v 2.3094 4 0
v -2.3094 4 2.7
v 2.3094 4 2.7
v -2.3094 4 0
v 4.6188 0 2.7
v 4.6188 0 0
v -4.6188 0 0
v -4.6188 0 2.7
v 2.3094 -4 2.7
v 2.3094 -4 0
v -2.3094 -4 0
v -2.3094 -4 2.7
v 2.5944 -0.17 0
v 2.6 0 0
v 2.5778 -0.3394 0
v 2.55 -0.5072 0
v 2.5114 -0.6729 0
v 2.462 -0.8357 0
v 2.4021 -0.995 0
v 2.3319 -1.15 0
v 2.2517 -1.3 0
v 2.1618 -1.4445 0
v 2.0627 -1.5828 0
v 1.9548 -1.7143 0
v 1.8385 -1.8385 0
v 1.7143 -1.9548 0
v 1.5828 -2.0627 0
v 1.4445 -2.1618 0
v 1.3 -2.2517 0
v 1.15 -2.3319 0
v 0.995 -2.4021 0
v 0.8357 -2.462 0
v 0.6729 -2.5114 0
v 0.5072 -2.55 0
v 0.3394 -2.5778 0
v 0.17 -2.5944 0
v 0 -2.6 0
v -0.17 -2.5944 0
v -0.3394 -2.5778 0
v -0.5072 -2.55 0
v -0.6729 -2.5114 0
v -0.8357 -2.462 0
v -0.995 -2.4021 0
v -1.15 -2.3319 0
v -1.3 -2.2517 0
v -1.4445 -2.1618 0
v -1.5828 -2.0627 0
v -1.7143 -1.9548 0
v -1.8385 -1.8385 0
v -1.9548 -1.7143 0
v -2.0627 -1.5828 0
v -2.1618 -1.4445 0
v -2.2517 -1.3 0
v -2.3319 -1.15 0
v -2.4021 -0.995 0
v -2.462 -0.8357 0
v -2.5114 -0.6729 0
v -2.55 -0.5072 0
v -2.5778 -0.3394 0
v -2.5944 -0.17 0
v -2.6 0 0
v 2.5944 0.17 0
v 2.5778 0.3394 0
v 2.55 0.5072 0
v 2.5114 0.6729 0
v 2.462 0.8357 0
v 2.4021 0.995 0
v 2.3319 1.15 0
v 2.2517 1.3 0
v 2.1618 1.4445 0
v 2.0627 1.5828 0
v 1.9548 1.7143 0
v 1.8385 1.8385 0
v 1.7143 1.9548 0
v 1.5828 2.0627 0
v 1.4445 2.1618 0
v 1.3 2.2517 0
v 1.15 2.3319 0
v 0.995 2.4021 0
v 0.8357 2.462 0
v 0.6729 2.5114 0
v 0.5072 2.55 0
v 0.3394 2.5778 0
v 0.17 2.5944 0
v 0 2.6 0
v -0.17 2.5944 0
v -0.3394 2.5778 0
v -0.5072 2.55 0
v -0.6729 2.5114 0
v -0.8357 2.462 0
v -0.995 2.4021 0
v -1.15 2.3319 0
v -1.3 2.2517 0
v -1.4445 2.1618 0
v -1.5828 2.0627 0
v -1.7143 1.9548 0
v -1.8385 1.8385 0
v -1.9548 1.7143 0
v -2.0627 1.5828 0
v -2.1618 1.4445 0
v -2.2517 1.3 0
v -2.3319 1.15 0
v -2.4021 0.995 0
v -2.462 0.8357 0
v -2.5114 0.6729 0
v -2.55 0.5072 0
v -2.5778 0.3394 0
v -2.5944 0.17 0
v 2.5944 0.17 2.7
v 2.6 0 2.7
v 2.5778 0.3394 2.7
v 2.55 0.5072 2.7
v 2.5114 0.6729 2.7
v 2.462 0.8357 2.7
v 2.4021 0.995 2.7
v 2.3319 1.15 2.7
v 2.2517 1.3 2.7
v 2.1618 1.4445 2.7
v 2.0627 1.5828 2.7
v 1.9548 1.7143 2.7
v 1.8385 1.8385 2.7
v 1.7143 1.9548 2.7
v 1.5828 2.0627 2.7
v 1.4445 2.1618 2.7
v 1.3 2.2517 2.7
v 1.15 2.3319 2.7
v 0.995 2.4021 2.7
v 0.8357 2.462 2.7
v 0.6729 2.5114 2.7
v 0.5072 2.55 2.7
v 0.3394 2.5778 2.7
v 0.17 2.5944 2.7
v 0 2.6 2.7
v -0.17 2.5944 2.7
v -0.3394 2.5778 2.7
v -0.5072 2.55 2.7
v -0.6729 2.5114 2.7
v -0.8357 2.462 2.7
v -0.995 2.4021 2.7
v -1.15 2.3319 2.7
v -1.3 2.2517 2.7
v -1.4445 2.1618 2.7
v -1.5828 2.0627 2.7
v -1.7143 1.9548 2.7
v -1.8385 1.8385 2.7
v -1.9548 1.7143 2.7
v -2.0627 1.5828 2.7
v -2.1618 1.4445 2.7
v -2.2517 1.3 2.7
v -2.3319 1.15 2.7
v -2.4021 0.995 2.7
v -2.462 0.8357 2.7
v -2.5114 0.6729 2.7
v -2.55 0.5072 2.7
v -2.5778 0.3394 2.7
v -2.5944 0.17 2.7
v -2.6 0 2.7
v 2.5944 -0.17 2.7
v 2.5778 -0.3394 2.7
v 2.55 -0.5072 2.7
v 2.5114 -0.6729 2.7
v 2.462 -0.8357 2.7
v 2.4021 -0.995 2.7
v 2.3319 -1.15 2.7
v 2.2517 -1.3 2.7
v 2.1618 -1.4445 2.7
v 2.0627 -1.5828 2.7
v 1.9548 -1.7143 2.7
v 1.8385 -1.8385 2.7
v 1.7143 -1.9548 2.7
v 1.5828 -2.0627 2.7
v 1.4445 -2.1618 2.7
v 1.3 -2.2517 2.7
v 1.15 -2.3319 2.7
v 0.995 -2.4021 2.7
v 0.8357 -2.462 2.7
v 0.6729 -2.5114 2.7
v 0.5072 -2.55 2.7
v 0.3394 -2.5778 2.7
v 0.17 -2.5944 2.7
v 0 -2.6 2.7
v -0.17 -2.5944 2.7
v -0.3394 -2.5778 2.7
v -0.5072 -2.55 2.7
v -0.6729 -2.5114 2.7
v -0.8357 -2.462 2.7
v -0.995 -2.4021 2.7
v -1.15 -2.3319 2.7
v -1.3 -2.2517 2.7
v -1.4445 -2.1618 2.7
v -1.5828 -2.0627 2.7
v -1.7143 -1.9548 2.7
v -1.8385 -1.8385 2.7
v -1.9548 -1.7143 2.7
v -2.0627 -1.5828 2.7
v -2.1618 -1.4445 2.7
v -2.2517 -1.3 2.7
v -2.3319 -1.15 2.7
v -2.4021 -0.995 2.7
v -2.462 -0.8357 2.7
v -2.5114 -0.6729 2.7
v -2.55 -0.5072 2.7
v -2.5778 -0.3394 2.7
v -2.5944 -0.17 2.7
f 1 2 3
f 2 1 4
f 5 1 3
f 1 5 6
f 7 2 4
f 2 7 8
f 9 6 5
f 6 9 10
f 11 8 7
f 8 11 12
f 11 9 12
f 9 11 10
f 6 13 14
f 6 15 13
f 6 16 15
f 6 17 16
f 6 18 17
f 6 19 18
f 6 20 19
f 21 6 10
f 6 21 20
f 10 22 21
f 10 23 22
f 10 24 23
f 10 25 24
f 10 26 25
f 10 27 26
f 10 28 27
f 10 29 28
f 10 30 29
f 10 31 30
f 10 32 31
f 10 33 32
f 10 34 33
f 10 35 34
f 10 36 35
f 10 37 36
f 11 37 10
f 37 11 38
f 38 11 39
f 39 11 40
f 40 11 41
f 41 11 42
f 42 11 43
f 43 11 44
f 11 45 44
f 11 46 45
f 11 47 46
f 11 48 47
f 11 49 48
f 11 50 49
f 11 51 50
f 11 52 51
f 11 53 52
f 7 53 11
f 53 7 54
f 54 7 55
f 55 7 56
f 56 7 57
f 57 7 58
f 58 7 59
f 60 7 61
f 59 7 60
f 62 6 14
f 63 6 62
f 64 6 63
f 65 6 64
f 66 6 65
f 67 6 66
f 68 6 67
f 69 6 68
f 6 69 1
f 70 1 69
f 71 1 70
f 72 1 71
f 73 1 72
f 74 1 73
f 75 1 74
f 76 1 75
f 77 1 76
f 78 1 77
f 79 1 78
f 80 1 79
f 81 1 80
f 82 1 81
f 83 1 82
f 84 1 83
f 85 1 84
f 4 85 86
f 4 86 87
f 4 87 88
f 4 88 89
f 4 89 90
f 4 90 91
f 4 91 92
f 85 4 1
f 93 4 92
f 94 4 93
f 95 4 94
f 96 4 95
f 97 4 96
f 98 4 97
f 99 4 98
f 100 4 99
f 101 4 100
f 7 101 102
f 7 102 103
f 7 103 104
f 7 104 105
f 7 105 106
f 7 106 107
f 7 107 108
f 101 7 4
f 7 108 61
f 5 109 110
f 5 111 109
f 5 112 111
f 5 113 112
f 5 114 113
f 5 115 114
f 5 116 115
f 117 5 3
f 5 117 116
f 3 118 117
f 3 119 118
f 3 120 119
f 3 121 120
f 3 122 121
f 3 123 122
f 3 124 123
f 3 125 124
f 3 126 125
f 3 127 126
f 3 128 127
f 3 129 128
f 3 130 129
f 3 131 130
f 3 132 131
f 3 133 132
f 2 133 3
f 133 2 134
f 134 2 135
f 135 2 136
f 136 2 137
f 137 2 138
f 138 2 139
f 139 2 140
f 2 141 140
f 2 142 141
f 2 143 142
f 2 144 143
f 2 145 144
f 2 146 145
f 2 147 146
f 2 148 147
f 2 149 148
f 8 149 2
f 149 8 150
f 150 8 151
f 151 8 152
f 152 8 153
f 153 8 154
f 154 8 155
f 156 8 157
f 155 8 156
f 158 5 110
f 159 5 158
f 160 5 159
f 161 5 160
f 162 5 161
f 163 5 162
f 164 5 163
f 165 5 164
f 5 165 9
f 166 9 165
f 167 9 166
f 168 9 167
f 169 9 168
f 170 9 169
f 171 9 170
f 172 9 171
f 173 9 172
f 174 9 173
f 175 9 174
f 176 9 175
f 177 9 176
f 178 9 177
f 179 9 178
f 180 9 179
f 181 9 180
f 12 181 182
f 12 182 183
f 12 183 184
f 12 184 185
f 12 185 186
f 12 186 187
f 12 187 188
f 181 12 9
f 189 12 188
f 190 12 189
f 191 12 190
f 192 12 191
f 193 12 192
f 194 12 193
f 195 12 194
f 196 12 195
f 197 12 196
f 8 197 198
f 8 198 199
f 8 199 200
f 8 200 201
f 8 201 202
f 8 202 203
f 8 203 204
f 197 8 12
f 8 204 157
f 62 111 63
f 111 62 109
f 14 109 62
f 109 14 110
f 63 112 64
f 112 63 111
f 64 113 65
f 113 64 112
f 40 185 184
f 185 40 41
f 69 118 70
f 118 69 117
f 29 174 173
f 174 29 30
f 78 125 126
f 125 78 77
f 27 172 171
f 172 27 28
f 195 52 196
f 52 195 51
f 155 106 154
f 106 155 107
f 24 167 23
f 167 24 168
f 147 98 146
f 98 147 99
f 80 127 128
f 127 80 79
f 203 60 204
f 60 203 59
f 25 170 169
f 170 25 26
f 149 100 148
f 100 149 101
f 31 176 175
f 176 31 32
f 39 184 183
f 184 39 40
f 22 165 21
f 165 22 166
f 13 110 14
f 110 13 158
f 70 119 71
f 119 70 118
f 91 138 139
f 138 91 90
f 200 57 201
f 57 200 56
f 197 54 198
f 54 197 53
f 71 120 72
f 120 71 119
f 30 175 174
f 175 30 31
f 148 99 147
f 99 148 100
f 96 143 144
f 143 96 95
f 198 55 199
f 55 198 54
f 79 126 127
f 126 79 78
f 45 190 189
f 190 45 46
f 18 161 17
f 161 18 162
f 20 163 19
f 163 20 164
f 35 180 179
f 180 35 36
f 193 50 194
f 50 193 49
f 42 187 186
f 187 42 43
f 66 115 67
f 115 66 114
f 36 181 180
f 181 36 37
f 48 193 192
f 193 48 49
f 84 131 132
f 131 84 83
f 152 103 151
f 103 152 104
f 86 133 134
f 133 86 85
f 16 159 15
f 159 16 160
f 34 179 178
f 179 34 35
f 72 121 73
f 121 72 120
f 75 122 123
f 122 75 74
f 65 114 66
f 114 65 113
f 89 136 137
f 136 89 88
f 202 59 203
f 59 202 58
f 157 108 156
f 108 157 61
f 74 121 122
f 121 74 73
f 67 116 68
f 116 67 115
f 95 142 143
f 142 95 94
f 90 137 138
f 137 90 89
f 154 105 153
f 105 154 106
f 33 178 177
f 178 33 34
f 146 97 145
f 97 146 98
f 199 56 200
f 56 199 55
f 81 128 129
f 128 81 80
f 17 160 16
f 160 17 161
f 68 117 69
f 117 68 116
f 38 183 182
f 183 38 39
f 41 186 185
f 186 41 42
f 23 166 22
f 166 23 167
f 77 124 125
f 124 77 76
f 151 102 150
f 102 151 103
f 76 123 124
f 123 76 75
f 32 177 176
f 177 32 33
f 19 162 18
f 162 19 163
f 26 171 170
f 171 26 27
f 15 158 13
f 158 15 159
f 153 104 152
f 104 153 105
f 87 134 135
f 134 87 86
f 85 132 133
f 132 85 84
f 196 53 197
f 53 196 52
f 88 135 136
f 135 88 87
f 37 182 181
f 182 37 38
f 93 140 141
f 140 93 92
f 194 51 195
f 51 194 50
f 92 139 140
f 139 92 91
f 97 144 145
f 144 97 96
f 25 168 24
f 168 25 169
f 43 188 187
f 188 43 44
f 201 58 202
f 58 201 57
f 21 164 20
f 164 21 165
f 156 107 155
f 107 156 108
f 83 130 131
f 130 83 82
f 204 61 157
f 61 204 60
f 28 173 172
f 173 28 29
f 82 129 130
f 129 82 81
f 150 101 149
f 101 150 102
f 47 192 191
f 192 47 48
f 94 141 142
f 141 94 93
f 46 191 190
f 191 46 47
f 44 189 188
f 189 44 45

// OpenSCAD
$fn = 96;

across_flats = 8.0;     // mm
thickness    = 2.7;     // mm
hole_d       = 5.2;     // mm (clearance for 5.0mm screw)

module hex_prism_af(af, h){
    // Regular hex with given across-flats (distance between opposite sides)
    // For a regular hex, circumradius R = af / sqrt(3)
    R = af / sqrt(3);
    linear_extrude(height=h)
        polygon(points=[
            [ R, 0],
            [ R/2,  R*sqrt(3)/2],
            [-R/2,  R*sqrt(3)/2],
            [-R, 0],
            [-R/2, -R*sqrt(3)/2],
            [ R/2, -R*sqrt(3)/2]
        ]);
}

difference(){
    hex_prism_af(across_flats, thickness);
    translate([0,0,-0.1])
        cylinder(d=hole_d, h=thickness+0.2);
}
